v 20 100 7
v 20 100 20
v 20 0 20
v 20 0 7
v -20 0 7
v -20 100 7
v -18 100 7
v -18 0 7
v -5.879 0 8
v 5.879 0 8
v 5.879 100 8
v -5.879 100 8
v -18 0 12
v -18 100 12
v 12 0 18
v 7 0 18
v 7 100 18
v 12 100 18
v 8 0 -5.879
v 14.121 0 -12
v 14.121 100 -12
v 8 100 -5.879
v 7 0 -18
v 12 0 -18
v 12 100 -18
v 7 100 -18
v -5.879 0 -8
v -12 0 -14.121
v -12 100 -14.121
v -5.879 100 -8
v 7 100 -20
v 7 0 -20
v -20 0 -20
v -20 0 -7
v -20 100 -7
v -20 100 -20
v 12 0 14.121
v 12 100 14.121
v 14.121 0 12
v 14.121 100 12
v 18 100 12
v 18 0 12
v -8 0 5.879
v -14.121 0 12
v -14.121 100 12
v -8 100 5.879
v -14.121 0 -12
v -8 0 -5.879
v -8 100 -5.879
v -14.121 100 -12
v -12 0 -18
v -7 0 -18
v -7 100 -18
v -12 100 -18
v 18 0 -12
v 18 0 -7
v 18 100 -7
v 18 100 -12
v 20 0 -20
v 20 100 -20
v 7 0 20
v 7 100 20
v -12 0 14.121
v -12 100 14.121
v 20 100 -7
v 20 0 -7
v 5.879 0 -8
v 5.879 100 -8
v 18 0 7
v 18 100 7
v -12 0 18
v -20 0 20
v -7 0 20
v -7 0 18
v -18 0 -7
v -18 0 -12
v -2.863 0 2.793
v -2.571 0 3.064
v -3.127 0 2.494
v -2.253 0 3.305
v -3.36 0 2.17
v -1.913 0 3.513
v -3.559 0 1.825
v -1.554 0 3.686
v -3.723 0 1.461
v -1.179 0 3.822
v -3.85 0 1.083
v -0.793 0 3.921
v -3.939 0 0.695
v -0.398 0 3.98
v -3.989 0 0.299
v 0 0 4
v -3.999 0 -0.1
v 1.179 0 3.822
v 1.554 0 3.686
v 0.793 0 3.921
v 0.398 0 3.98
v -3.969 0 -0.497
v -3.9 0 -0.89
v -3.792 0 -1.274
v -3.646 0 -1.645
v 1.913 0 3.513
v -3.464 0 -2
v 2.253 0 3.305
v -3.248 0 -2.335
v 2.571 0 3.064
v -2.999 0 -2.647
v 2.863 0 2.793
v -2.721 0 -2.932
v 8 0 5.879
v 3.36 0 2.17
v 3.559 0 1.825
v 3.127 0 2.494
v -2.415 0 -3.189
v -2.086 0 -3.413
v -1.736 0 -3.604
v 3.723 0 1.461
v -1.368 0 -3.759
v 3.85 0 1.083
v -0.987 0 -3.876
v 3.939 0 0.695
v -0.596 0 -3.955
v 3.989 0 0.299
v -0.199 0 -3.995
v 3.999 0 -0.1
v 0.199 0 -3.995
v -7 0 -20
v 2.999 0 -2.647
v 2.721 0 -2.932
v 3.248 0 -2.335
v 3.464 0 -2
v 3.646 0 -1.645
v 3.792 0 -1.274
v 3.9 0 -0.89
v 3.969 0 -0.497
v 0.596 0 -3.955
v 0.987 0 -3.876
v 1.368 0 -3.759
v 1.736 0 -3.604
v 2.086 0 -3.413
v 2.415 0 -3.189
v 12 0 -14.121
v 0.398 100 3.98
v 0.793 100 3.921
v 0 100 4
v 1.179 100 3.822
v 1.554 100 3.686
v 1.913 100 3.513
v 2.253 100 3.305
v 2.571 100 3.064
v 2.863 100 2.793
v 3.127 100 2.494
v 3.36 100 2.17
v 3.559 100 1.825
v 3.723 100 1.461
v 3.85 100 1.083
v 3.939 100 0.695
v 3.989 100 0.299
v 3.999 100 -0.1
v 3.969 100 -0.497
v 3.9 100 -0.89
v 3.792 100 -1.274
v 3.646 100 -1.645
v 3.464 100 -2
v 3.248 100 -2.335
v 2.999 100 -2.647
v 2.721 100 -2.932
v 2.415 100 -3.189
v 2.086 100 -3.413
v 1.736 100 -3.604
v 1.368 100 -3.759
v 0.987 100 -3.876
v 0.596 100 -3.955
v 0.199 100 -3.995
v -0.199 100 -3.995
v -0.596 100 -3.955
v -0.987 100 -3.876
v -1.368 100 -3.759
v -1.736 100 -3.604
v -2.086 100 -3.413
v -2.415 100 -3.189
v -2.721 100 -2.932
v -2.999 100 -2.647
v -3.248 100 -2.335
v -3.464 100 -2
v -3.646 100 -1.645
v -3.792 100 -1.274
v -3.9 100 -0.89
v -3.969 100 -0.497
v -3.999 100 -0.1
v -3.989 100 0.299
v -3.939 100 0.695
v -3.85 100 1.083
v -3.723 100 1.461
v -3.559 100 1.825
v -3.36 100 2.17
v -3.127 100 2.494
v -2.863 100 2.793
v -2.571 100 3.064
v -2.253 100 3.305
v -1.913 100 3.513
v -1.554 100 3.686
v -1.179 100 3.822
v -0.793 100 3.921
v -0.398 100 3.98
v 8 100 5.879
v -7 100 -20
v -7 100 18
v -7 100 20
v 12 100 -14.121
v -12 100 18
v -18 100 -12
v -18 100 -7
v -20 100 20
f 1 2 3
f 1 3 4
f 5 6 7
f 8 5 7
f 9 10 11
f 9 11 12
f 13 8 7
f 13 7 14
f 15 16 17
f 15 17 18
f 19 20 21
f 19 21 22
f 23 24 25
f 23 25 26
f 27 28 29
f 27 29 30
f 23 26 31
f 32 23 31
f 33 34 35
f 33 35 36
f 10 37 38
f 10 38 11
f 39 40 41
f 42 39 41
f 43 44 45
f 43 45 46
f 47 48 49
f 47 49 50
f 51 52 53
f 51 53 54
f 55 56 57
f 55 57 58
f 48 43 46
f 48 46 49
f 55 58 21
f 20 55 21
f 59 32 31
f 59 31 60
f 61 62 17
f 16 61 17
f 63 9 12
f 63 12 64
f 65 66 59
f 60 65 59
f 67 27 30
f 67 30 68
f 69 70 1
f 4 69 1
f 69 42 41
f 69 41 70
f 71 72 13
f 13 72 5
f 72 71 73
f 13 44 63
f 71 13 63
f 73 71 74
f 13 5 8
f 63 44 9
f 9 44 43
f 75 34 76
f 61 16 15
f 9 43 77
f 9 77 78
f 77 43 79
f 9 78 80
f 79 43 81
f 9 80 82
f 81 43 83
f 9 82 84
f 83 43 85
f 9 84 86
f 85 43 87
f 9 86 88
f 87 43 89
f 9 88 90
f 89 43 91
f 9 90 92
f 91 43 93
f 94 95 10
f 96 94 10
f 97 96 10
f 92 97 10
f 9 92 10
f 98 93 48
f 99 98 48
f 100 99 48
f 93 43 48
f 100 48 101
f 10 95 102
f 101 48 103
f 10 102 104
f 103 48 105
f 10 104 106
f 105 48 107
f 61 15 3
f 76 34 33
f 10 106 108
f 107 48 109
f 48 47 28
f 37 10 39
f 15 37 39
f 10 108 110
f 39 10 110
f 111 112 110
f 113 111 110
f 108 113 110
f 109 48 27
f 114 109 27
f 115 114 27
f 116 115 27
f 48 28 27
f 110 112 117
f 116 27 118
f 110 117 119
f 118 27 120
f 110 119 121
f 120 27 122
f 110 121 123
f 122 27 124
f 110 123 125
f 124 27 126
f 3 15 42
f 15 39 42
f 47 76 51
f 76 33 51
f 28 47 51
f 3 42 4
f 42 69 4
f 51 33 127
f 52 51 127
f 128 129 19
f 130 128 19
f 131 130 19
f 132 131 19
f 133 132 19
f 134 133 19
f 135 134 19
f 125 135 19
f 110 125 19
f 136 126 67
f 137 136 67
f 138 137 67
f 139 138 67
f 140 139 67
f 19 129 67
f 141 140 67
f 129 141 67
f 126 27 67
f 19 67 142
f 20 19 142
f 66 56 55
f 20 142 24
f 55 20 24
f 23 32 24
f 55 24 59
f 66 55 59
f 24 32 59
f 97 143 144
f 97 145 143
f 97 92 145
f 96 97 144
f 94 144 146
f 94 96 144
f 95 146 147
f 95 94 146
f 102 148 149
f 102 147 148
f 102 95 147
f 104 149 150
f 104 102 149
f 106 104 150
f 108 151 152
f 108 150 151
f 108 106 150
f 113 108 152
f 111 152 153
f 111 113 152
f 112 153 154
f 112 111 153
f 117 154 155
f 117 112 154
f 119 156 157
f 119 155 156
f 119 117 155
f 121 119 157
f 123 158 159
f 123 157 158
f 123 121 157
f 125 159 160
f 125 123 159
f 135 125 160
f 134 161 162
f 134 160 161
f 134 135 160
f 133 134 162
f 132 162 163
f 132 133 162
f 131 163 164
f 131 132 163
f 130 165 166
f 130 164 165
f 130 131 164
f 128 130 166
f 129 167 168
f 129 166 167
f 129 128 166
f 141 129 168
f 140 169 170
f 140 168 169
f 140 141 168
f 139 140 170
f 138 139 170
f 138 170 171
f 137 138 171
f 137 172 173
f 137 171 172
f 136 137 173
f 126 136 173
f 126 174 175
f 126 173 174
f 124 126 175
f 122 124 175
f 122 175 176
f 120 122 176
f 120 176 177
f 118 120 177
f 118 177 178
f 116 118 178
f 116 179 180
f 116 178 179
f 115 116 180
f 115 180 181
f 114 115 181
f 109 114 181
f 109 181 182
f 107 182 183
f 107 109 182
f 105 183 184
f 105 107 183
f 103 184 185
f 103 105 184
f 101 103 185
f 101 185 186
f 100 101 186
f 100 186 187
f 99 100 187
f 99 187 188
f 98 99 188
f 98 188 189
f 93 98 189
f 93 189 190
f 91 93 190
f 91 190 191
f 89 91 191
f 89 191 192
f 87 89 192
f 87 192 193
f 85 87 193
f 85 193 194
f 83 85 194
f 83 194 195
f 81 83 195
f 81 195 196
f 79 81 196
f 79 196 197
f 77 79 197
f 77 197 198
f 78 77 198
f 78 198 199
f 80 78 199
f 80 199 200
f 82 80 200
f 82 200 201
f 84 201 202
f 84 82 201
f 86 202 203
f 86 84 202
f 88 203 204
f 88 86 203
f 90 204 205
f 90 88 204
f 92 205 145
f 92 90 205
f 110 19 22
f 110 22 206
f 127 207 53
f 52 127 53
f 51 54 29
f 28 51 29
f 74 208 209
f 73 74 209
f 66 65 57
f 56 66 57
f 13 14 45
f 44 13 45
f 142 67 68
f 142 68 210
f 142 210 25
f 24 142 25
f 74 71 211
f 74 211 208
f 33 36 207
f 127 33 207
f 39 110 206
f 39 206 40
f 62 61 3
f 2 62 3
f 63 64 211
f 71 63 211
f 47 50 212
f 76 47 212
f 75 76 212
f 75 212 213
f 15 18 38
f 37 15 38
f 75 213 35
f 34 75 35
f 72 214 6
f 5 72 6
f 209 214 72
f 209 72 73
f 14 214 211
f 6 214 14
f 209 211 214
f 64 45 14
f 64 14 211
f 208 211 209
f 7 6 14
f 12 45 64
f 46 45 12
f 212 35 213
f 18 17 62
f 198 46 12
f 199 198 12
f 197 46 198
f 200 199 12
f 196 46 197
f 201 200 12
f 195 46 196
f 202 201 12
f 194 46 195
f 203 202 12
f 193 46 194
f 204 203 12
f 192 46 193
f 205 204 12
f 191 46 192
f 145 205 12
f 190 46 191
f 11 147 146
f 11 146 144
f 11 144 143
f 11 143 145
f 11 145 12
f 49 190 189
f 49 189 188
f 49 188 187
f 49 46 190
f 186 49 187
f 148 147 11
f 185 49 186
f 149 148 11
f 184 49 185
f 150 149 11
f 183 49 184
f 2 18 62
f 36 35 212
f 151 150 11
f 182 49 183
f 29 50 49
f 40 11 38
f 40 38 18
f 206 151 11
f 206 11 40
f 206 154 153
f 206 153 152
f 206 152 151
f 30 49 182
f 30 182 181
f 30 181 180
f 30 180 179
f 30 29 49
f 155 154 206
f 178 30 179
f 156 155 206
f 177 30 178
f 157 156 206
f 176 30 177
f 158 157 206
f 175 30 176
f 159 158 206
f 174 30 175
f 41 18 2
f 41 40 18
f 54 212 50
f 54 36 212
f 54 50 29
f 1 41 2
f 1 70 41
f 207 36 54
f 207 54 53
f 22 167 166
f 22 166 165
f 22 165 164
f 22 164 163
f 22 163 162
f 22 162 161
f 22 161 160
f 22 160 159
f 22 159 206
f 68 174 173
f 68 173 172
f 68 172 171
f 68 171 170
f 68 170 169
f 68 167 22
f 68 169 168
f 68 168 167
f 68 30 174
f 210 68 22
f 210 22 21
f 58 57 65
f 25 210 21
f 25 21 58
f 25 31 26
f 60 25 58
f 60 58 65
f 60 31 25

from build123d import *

# Parameters (mm, degrees)
SKETCH1_W               = 40
SKETCH1_H               = 40
BOSS_EXTRUDE1_DEPTH     = 100
CUT_EXTRUDE1_DEPTH      = 104.923048454
CUT_EXTRUDE1_DEPTH_BACK = 104.923048454
SKETCH2_R               = 4


with BuildPart() as part:
    # Sketch1 → Boss-Extrude1 (new body)
    with BuildSketch(Plane(origin=(0, 0, 0), x_dir=(1, 0, 0), z_dir=(0, 1, 0))):
        Rectangle(SKETCH1_W, SKETCH1_H)
    extrude(amount=BOSS_EXTRUDE1_DEPTH)

    # Sketch2 → Cut-Extrude1 (cut, two sides: drawn at the far end of the back side and taken through both)
    with BuildSketch(Plane(origin=(0, 100, 0), x_dir=(1, 0, 0), z_dir=(0, 1, 0)).offset(-CUT_EXTRUDE1_DEPTH_BACK)):
        with Locations(Location((0, 0, 0), (0, 0, 270))):
            Circle(SKETCH2_R)
        Polygon((-7, 20), (-7, 18), (-12, 18), (-12, 14.121320344), (-5.878679656, 8), (5.878679656, 8), (12, 14.121320344), (12, 18), (7, 18), (7, 20), align=None)
        Polygon((20, 7), (18, 7), (18, 12), (14.121320344, 12), (8, 5.878679656), (8, -5.878679656), (14.121320344, -12), (18, -12), (18, -7), (20, -7), align=None)
        Polygon((7, -20), (7, -18), (12, -18), (12, -14.121320344), (5.878679656, -8), (-5.878679656, -8), (-12, -14.121320344), (-12, -18), (-7, -18), (-7, -20), align=None)
        Polygon((-20, -7), (-18, -7), (-18, -12), (-14.121320344, -12), (-8, -5.878679656), (-8, 5.878679656), (-14.121320344, 12), (-18, 12), (-18, 7), (-20, 7), align=None)
    extrude(amount=CUT_EXTRUDE1_DEPTH + CUT_EXTRUDE1_DEPTH_BACK, mode=Mode.SUBTRACT)


solid = part.part
